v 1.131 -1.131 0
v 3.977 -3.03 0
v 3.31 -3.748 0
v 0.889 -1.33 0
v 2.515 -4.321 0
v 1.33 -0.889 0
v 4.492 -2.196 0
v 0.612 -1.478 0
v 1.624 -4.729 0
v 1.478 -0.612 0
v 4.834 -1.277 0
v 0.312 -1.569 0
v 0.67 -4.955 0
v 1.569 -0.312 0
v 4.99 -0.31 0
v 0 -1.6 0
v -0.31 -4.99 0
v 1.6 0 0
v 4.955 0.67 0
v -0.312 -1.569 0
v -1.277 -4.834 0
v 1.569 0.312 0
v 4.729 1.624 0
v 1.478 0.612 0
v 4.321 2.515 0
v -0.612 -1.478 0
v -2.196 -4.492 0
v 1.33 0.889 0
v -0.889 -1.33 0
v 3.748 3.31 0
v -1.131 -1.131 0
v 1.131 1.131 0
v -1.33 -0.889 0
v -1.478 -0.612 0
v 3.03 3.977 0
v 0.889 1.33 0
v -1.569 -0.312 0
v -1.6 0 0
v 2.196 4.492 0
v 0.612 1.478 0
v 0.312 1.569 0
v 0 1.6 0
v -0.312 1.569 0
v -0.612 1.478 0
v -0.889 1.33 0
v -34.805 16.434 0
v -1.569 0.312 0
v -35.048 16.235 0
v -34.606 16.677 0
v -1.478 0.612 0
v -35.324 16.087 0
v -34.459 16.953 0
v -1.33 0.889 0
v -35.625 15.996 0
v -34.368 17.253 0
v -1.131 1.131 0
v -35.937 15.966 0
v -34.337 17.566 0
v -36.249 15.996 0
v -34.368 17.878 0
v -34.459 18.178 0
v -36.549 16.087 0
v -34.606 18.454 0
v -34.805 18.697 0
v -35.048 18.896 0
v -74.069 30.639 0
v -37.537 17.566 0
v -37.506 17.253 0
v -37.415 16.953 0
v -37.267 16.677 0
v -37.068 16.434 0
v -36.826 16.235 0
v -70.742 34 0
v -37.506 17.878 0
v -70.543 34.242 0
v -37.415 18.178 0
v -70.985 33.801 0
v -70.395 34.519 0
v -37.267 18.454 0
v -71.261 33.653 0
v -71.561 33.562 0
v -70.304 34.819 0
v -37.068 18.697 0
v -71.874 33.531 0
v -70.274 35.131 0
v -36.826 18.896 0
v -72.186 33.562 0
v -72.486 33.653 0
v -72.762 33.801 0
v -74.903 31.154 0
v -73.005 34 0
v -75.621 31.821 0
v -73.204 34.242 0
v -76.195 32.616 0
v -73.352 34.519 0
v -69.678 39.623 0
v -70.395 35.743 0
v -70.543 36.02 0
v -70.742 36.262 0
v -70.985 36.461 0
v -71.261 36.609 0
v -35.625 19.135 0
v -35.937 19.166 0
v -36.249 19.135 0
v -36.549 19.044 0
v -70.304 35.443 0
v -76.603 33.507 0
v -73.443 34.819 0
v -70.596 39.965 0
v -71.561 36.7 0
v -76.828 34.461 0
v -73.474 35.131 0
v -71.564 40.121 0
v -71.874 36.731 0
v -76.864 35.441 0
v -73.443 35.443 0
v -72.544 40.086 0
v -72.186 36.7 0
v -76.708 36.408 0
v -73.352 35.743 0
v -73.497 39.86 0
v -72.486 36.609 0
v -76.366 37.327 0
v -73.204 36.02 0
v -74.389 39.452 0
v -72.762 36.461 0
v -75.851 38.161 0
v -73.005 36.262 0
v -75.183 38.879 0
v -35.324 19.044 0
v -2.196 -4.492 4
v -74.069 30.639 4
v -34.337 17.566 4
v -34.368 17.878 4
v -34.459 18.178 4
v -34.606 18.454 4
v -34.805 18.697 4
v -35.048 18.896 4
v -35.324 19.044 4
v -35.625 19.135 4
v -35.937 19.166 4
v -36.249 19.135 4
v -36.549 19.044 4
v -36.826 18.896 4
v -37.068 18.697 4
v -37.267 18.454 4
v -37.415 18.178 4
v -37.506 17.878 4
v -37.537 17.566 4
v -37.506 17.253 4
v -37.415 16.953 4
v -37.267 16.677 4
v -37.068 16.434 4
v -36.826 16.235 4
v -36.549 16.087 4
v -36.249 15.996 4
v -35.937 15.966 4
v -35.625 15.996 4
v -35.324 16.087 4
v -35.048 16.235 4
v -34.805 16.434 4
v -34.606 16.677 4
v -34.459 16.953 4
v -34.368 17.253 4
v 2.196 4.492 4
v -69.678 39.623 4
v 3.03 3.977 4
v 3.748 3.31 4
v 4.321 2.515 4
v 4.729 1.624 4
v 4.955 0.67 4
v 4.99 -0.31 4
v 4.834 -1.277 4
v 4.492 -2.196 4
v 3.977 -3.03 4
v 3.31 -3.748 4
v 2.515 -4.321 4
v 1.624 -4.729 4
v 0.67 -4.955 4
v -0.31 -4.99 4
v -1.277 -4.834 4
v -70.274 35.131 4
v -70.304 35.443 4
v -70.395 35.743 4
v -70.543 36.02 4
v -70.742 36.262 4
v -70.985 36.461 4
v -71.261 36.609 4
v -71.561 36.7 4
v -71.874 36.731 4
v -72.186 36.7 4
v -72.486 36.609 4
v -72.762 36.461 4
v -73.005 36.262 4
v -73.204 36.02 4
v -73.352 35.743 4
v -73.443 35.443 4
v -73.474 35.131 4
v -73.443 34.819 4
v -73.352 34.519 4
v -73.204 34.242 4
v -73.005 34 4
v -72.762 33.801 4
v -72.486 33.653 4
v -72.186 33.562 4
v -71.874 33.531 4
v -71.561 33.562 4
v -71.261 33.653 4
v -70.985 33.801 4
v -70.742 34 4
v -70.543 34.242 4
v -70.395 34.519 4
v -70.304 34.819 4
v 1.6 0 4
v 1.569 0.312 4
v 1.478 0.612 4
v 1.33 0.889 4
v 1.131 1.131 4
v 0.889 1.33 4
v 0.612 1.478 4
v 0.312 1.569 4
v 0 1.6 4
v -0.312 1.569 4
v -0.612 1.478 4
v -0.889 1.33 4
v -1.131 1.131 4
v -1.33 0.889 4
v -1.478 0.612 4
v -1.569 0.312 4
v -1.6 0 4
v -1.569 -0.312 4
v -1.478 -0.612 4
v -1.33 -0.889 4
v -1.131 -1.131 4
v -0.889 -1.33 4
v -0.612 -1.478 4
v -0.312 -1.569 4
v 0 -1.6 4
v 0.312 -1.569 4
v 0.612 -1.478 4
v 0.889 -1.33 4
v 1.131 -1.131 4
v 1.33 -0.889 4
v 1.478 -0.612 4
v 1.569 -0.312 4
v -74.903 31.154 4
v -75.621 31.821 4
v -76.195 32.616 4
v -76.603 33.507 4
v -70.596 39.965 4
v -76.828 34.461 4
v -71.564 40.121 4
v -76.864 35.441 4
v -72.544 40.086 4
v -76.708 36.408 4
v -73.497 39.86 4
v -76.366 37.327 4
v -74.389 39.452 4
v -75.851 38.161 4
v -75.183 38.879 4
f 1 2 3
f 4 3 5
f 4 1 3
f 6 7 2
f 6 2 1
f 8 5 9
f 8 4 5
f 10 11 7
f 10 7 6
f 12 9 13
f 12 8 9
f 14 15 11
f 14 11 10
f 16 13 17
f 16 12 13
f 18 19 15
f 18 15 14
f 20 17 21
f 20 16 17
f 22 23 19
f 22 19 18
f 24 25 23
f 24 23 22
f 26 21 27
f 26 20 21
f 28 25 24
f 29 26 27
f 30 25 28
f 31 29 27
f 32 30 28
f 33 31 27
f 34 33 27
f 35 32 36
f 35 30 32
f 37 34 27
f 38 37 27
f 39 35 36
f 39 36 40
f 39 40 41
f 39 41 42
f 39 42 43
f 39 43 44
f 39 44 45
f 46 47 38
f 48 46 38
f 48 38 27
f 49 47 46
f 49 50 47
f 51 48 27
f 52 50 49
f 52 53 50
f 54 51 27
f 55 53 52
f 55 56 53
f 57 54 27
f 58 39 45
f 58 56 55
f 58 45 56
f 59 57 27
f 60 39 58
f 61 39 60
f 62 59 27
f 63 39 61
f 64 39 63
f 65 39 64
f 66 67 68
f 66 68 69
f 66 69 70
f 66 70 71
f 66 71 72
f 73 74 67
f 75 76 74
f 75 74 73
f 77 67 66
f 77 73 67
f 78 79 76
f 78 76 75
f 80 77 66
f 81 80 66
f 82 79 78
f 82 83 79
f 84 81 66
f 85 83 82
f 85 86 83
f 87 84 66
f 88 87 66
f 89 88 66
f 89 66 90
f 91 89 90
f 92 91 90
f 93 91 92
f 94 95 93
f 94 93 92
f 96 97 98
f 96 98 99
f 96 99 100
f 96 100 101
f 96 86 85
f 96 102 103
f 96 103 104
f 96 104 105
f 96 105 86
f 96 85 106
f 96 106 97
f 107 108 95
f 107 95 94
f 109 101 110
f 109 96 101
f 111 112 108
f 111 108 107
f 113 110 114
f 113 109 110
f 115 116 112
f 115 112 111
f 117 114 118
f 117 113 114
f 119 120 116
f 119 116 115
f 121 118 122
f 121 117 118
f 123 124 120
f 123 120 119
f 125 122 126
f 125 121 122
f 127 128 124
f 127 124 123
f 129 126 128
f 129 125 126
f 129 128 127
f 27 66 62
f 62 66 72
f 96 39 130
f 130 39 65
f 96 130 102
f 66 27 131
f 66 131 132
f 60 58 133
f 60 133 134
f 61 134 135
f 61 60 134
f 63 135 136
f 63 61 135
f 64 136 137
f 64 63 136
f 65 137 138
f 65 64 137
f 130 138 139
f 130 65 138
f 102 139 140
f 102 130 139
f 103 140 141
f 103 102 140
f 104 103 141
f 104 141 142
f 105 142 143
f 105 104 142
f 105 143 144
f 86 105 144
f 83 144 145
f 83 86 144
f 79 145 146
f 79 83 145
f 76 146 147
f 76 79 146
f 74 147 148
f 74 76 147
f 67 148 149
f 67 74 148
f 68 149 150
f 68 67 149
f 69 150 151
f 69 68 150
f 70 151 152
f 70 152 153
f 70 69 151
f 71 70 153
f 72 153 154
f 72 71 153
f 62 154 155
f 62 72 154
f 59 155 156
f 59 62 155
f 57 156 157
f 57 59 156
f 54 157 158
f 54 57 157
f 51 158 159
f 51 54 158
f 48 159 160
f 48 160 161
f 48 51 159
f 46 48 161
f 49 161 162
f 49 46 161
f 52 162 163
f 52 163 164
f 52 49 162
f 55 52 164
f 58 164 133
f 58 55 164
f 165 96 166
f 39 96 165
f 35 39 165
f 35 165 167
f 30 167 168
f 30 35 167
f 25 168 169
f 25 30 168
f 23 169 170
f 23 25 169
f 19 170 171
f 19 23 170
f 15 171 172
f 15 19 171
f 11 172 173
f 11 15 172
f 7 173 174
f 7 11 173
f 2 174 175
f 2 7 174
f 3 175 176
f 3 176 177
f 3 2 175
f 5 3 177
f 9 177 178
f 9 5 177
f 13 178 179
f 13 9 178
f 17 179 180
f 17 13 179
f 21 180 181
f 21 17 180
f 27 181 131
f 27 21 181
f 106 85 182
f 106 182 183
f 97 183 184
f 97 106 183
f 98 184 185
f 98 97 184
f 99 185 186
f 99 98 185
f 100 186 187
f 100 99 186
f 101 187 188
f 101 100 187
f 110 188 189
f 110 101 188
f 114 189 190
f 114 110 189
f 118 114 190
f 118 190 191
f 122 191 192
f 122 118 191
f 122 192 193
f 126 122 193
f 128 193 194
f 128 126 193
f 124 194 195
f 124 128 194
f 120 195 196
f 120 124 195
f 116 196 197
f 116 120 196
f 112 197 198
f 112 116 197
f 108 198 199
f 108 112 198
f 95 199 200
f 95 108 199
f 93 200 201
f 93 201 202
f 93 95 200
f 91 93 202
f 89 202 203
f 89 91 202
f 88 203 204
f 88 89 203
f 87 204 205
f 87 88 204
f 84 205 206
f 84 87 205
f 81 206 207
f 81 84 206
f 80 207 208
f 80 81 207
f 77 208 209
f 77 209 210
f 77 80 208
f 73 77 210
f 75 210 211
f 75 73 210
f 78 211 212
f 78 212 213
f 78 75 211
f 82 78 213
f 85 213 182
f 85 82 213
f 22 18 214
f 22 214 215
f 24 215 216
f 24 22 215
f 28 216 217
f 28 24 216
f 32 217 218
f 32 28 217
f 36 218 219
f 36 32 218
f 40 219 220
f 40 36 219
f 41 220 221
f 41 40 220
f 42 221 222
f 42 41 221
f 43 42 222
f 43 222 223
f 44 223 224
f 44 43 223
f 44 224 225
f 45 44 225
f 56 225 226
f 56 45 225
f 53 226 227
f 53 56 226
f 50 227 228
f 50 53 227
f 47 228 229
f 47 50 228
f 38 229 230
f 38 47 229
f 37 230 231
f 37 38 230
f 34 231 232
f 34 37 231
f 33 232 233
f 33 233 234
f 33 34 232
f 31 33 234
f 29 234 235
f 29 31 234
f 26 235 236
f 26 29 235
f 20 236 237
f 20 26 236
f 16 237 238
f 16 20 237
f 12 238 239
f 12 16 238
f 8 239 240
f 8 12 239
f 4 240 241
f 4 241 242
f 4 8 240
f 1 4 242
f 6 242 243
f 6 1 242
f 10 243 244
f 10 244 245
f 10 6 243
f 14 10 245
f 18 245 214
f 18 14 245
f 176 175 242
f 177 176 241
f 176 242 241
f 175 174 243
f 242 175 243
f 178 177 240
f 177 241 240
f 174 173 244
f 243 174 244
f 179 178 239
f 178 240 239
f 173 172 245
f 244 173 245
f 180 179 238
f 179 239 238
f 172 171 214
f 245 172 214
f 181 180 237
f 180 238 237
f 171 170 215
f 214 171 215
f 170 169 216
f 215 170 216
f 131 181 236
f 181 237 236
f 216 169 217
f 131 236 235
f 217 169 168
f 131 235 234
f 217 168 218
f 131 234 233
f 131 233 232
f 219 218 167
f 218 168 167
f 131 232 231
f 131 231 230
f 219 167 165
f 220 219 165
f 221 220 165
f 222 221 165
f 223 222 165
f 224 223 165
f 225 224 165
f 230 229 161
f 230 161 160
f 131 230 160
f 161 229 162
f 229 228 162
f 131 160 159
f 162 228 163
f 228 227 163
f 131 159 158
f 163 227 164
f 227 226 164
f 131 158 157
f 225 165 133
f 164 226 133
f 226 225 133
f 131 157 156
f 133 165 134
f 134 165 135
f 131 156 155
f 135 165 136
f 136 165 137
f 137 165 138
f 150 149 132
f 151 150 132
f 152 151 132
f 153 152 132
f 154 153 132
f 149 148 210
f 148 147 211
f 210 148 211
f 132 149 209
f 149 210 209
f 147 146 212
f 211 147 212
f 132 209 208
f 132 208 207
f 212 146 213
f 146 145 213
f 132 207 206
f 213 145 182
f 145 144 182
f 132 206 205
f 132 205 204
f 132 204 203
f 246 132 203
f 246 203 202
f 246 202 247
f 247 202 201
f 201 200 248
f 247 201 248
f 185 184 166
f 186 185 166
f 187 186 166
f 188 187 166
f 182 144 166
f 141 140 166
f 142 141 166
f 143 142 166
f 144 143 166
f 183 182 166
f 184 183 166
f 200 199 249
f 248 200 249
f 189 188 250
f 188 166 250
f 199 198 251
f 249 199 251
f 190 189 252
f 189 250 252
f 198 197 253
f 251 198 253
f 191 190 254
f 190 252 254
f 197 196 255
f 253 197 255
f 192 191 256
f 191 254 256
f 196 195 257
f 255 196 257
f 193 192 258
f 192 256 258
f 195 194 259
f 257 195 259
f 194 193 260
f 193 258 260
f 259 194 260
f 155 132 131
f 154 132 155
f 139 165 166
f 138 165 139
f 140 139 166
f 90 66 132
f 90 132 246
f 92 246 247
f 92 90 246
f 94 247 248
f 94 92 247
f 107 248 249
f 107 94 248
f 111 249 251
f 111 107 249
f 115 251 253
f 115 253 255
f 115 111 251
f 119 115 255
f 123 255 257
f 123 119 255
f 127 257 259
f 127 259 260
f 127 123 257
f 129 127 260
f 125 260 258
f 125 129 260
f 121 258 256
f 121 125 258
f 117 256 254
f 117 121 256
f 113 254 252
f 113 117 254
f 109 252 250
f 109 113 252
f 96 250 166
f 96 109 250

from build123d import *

# Parameters (mm, degrees)
SKETCH1_R           = 1.6
BOSS_EXTRUDE1_DEPTH = 4


with BuildPart() as part:
    # Sketch1 → Boss-Extrude1 (new body)
    with BuildSketch(Plane.XY):
        with BuildLine():
            Line((-2.195689363, -4.492098421), (-74.069264096, 30.638931382))
            ThreePointArc((-74.069264096, 30.638931382), (-76.365673155, 37.326719165), (-69.677885371, 39.623128223))
            Line((-69.677885371, 39.623128223), (2.195689363, 4.492098421))
            ThreePointArc((2.195689363, 4.492098421), (4.492098421, -2.195689363), (-2.195689363, -4.492098421))
        make_face()
        with Locations((-71.873574734, 35.131029803)):
            Circle(SKETCH1_R, mode=Mode.SUBTRACT)
        Circle(SKETCH1_R, mode=Mode.SUBTRACT)
        with Locations((-35.936787367, 17.565514901)):
            Circle(SKETCH1_R, mode=Mode.SUBTRACT)
    extrude(amount=BOSS_EXTRUDE1_DEPTH)


solid = part.part
